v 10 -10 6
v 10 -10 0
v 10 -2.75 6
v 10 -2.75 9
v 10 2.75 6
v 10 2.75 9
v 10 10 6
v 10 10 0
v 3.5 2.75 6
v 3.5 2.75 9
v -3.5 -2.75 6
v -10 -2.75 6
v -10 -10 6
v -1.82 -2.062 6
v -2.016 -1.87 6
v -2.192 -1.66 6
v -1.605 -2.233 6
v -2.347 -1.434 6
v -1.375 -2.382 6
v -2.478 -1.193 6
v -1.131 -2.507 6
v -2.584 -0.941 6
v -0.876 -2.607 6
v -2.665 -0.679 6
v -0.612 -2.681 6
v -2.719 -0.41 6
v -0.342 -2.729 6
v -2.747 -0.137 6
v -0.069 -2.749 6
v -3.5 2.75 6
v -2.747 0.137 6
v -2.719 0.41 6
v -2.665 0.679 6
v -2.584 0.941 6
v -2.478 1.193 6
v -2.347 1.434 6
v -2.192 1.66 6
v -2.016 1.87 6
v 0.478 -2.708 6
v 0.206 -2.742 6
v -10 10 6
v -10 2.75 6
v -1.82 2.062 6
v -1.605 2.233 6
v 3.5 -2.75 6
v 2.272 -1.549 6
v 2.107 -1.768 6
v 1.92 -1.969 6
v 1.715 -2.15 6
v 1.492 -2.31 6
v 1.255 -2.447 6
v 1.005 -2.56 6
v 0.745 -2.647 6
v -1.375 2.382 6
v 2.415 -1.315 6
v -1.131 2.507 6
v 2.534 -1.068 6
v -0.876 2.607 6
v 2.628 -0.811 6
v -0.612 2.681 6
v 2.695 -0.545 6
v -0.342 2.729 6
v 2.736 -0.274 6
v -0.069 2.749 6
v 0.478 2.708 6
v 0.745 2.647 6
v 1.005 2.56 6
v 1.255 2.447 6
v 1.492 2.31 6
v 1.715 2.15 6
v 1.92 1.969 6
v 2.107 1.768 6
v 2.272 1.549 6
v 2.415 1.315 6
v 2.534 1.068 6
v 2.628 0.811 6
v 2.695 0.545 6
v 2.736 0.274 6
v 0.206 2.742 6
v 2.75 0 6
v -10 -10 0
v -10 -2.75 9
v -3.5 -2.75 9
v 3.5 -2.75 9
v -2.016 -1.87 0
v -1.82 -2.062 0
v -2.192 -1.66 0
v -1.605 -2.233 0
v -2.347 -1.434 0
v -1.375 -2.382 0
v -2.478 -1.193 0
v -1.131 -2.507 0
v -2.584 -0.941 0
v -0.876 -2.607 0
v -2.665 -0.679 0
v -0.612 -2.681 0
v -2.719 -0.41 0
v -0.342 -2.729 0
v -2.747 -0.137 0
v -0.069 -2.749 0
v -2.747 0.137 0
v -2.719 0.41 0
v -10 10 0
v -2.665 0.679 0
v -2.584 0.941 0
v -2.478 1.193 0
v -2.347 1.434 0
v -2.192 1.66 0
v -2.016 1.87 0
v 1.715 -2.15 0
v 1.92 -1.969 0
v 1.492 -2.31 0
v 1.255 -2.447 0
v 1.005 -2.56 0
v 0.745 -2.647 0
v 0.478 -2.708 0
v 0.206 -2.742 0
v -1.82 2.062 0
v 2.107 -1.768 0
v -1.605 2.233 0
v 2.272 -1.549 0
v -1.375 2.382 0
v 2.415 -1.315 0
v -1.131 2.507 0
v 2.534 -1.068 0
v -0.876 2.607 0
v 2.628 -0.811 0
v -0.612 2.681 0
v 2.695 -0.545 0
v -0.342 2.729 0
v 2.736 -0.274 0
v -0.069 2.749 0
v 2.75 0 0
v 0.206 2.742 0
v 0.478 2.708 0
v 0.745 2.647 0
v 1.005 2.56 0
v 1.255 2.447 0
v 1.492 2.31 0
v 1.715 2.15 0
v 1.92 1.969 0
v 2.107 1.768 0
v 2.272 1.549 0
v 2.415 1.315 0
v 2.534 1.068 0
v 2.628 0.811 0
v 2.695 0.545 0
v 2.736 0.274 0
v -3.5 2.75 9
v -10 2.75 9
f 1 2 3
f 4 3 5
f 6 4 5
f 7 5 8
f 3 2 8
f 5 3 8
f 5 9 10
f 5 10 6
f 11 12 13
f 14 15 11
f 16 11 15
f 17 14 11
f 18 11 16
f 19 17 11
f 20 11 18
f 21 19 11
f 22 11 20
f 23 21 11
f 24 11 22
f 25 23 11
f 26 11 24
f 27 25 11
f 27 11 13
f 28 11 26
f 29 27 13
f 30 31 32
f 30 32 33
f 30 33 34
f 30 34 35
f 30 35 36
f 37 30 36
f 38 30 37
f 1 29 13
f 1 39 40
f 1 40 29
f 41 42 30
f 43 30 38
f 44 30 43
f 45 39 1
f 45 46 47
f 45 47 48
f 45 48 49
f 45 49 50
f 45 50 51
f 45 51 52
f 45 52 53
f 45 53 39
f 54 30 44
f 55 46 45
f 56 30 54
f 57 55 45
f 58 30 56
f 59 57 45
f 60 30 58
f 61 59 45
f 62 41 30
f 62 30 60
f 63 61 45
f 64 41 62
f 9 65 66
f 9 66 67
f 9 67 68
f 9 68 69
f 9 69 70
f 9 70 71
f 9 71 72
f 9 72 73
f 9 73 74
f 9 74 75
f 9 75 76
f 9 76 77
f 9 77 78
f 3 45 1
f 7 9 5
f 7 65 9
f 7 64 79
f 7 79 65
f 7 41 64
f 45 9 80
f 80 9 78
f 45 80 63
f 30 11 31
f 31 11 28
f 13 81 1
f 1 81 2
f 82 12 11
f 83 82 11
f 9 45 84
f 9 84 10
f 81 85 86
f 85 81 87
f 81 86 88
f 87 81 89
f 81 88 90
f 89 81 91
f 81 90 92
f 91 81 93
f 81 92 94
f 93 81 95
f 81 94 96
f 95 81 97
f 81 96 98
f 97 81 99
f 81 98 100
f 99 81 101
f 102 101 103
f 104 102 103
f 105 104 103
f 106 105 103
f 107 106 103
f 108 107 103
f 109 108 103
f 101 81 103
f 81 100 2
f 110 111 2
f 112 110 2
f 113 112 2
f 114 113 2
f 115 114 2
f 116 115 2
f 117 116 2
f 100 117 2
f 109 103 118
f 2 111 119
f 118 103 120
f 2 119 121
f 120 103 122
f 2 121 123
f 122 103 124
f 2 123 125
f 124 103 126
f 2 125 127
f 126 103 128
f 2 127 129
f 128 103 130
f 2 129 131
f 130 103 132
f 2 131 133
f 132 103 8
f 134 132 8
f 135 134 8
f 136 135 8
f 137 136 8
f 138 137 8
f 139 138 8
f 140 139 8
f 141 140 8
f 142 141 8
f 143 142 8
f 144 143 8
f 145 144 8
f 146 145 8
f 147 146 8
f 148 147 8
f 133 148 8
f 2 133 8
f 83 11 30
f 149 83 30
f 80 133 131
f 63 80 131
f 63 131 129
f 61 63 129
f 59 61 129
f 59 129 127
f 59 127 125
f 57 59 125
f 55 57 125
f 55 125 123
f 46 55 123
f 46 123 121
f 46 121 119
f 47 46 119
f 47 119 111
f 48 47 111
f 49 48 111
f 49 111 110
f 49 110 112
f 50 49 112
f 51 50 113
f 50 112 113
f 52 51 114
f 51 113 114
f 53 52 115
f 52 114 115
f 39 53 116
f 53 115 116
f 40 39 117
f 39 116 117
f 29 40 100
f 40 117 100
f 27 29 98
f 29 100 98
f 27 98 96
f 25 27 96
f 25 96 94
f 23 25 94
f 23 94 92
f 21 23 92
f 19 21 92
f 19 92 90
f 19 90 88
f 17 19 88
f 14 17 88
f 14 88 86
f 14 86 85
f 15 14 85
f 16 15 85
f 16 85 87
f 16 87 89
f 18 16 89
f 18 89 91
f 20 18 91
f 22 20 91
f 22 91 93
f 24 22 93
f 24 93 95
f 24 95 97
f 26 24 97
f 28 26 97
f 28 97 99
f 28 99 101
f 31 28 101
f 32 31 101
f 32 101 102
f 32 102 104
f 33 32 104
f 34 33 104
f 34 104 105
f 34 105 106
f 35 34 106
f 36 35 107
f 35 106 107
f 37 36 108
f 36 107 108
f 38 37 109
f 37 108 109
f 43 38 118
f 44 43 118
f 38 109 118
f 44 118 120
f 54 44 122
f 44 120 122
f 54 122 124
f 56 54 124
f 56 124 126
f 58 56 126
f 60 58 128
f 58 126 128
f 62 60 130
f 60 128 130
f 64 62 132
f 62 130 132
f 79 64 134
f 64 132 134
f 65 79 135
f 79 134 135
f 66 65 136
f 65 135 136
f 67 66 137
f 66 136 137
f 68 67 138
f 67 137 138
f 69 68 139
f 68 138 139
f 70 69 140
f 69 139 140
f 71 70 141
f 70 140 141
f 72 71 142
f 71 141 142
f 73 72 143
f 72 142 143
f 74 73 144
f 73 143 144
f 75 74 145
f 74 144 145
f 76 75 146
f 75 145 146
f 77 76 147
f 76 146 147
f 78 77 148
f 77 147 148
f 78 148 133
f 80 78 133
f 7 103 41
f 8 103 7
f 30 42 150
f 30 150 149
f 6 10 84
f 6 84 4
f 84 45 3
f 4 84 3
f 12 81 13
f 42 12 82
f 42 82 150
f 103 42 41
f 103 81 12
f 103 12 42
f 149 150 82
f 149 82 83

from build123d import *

# Parameters (mm, degrees)
F0_W     = 20
F0_H     = 20
F1_DEPTH = 6
F2_W     = 6.5
F2_H     = 5.5
F3_DEPTH = 3
F4_R     = 2.75
F5_DEPTH = 9.001


with BuildPart() as f1:
    # F0 (on Top) → F1 (new body)
    with BuildSketch(Plane.XY):
        Rectangle(F0_W, F0_H)
    extrude(amount=F1_DEPTH)

    # F2 (on face) → F3 (join)
    with BuildSketch(Plane.XY.offset(6)):
        with Locations((6.75, 0)):
            Rectangle(F2_W, F2_H)
        with Locations((-6.75, 0)):
            Rectangle(F2_W, F2_H)
    extrude(amount=F3_DEPTH)

    # F4 (on face) → F5 (cut, through all)
    with BuildSketch(Plane(origin=(0, 0, 0), x_dir=(1, 0, 0), z_dir=(0, 0, -1))):
        Circle(F4_R)
    extrude(amount=-F5_DEPTH, mode=Mode.SUBTRACT)


solid = f1.part
